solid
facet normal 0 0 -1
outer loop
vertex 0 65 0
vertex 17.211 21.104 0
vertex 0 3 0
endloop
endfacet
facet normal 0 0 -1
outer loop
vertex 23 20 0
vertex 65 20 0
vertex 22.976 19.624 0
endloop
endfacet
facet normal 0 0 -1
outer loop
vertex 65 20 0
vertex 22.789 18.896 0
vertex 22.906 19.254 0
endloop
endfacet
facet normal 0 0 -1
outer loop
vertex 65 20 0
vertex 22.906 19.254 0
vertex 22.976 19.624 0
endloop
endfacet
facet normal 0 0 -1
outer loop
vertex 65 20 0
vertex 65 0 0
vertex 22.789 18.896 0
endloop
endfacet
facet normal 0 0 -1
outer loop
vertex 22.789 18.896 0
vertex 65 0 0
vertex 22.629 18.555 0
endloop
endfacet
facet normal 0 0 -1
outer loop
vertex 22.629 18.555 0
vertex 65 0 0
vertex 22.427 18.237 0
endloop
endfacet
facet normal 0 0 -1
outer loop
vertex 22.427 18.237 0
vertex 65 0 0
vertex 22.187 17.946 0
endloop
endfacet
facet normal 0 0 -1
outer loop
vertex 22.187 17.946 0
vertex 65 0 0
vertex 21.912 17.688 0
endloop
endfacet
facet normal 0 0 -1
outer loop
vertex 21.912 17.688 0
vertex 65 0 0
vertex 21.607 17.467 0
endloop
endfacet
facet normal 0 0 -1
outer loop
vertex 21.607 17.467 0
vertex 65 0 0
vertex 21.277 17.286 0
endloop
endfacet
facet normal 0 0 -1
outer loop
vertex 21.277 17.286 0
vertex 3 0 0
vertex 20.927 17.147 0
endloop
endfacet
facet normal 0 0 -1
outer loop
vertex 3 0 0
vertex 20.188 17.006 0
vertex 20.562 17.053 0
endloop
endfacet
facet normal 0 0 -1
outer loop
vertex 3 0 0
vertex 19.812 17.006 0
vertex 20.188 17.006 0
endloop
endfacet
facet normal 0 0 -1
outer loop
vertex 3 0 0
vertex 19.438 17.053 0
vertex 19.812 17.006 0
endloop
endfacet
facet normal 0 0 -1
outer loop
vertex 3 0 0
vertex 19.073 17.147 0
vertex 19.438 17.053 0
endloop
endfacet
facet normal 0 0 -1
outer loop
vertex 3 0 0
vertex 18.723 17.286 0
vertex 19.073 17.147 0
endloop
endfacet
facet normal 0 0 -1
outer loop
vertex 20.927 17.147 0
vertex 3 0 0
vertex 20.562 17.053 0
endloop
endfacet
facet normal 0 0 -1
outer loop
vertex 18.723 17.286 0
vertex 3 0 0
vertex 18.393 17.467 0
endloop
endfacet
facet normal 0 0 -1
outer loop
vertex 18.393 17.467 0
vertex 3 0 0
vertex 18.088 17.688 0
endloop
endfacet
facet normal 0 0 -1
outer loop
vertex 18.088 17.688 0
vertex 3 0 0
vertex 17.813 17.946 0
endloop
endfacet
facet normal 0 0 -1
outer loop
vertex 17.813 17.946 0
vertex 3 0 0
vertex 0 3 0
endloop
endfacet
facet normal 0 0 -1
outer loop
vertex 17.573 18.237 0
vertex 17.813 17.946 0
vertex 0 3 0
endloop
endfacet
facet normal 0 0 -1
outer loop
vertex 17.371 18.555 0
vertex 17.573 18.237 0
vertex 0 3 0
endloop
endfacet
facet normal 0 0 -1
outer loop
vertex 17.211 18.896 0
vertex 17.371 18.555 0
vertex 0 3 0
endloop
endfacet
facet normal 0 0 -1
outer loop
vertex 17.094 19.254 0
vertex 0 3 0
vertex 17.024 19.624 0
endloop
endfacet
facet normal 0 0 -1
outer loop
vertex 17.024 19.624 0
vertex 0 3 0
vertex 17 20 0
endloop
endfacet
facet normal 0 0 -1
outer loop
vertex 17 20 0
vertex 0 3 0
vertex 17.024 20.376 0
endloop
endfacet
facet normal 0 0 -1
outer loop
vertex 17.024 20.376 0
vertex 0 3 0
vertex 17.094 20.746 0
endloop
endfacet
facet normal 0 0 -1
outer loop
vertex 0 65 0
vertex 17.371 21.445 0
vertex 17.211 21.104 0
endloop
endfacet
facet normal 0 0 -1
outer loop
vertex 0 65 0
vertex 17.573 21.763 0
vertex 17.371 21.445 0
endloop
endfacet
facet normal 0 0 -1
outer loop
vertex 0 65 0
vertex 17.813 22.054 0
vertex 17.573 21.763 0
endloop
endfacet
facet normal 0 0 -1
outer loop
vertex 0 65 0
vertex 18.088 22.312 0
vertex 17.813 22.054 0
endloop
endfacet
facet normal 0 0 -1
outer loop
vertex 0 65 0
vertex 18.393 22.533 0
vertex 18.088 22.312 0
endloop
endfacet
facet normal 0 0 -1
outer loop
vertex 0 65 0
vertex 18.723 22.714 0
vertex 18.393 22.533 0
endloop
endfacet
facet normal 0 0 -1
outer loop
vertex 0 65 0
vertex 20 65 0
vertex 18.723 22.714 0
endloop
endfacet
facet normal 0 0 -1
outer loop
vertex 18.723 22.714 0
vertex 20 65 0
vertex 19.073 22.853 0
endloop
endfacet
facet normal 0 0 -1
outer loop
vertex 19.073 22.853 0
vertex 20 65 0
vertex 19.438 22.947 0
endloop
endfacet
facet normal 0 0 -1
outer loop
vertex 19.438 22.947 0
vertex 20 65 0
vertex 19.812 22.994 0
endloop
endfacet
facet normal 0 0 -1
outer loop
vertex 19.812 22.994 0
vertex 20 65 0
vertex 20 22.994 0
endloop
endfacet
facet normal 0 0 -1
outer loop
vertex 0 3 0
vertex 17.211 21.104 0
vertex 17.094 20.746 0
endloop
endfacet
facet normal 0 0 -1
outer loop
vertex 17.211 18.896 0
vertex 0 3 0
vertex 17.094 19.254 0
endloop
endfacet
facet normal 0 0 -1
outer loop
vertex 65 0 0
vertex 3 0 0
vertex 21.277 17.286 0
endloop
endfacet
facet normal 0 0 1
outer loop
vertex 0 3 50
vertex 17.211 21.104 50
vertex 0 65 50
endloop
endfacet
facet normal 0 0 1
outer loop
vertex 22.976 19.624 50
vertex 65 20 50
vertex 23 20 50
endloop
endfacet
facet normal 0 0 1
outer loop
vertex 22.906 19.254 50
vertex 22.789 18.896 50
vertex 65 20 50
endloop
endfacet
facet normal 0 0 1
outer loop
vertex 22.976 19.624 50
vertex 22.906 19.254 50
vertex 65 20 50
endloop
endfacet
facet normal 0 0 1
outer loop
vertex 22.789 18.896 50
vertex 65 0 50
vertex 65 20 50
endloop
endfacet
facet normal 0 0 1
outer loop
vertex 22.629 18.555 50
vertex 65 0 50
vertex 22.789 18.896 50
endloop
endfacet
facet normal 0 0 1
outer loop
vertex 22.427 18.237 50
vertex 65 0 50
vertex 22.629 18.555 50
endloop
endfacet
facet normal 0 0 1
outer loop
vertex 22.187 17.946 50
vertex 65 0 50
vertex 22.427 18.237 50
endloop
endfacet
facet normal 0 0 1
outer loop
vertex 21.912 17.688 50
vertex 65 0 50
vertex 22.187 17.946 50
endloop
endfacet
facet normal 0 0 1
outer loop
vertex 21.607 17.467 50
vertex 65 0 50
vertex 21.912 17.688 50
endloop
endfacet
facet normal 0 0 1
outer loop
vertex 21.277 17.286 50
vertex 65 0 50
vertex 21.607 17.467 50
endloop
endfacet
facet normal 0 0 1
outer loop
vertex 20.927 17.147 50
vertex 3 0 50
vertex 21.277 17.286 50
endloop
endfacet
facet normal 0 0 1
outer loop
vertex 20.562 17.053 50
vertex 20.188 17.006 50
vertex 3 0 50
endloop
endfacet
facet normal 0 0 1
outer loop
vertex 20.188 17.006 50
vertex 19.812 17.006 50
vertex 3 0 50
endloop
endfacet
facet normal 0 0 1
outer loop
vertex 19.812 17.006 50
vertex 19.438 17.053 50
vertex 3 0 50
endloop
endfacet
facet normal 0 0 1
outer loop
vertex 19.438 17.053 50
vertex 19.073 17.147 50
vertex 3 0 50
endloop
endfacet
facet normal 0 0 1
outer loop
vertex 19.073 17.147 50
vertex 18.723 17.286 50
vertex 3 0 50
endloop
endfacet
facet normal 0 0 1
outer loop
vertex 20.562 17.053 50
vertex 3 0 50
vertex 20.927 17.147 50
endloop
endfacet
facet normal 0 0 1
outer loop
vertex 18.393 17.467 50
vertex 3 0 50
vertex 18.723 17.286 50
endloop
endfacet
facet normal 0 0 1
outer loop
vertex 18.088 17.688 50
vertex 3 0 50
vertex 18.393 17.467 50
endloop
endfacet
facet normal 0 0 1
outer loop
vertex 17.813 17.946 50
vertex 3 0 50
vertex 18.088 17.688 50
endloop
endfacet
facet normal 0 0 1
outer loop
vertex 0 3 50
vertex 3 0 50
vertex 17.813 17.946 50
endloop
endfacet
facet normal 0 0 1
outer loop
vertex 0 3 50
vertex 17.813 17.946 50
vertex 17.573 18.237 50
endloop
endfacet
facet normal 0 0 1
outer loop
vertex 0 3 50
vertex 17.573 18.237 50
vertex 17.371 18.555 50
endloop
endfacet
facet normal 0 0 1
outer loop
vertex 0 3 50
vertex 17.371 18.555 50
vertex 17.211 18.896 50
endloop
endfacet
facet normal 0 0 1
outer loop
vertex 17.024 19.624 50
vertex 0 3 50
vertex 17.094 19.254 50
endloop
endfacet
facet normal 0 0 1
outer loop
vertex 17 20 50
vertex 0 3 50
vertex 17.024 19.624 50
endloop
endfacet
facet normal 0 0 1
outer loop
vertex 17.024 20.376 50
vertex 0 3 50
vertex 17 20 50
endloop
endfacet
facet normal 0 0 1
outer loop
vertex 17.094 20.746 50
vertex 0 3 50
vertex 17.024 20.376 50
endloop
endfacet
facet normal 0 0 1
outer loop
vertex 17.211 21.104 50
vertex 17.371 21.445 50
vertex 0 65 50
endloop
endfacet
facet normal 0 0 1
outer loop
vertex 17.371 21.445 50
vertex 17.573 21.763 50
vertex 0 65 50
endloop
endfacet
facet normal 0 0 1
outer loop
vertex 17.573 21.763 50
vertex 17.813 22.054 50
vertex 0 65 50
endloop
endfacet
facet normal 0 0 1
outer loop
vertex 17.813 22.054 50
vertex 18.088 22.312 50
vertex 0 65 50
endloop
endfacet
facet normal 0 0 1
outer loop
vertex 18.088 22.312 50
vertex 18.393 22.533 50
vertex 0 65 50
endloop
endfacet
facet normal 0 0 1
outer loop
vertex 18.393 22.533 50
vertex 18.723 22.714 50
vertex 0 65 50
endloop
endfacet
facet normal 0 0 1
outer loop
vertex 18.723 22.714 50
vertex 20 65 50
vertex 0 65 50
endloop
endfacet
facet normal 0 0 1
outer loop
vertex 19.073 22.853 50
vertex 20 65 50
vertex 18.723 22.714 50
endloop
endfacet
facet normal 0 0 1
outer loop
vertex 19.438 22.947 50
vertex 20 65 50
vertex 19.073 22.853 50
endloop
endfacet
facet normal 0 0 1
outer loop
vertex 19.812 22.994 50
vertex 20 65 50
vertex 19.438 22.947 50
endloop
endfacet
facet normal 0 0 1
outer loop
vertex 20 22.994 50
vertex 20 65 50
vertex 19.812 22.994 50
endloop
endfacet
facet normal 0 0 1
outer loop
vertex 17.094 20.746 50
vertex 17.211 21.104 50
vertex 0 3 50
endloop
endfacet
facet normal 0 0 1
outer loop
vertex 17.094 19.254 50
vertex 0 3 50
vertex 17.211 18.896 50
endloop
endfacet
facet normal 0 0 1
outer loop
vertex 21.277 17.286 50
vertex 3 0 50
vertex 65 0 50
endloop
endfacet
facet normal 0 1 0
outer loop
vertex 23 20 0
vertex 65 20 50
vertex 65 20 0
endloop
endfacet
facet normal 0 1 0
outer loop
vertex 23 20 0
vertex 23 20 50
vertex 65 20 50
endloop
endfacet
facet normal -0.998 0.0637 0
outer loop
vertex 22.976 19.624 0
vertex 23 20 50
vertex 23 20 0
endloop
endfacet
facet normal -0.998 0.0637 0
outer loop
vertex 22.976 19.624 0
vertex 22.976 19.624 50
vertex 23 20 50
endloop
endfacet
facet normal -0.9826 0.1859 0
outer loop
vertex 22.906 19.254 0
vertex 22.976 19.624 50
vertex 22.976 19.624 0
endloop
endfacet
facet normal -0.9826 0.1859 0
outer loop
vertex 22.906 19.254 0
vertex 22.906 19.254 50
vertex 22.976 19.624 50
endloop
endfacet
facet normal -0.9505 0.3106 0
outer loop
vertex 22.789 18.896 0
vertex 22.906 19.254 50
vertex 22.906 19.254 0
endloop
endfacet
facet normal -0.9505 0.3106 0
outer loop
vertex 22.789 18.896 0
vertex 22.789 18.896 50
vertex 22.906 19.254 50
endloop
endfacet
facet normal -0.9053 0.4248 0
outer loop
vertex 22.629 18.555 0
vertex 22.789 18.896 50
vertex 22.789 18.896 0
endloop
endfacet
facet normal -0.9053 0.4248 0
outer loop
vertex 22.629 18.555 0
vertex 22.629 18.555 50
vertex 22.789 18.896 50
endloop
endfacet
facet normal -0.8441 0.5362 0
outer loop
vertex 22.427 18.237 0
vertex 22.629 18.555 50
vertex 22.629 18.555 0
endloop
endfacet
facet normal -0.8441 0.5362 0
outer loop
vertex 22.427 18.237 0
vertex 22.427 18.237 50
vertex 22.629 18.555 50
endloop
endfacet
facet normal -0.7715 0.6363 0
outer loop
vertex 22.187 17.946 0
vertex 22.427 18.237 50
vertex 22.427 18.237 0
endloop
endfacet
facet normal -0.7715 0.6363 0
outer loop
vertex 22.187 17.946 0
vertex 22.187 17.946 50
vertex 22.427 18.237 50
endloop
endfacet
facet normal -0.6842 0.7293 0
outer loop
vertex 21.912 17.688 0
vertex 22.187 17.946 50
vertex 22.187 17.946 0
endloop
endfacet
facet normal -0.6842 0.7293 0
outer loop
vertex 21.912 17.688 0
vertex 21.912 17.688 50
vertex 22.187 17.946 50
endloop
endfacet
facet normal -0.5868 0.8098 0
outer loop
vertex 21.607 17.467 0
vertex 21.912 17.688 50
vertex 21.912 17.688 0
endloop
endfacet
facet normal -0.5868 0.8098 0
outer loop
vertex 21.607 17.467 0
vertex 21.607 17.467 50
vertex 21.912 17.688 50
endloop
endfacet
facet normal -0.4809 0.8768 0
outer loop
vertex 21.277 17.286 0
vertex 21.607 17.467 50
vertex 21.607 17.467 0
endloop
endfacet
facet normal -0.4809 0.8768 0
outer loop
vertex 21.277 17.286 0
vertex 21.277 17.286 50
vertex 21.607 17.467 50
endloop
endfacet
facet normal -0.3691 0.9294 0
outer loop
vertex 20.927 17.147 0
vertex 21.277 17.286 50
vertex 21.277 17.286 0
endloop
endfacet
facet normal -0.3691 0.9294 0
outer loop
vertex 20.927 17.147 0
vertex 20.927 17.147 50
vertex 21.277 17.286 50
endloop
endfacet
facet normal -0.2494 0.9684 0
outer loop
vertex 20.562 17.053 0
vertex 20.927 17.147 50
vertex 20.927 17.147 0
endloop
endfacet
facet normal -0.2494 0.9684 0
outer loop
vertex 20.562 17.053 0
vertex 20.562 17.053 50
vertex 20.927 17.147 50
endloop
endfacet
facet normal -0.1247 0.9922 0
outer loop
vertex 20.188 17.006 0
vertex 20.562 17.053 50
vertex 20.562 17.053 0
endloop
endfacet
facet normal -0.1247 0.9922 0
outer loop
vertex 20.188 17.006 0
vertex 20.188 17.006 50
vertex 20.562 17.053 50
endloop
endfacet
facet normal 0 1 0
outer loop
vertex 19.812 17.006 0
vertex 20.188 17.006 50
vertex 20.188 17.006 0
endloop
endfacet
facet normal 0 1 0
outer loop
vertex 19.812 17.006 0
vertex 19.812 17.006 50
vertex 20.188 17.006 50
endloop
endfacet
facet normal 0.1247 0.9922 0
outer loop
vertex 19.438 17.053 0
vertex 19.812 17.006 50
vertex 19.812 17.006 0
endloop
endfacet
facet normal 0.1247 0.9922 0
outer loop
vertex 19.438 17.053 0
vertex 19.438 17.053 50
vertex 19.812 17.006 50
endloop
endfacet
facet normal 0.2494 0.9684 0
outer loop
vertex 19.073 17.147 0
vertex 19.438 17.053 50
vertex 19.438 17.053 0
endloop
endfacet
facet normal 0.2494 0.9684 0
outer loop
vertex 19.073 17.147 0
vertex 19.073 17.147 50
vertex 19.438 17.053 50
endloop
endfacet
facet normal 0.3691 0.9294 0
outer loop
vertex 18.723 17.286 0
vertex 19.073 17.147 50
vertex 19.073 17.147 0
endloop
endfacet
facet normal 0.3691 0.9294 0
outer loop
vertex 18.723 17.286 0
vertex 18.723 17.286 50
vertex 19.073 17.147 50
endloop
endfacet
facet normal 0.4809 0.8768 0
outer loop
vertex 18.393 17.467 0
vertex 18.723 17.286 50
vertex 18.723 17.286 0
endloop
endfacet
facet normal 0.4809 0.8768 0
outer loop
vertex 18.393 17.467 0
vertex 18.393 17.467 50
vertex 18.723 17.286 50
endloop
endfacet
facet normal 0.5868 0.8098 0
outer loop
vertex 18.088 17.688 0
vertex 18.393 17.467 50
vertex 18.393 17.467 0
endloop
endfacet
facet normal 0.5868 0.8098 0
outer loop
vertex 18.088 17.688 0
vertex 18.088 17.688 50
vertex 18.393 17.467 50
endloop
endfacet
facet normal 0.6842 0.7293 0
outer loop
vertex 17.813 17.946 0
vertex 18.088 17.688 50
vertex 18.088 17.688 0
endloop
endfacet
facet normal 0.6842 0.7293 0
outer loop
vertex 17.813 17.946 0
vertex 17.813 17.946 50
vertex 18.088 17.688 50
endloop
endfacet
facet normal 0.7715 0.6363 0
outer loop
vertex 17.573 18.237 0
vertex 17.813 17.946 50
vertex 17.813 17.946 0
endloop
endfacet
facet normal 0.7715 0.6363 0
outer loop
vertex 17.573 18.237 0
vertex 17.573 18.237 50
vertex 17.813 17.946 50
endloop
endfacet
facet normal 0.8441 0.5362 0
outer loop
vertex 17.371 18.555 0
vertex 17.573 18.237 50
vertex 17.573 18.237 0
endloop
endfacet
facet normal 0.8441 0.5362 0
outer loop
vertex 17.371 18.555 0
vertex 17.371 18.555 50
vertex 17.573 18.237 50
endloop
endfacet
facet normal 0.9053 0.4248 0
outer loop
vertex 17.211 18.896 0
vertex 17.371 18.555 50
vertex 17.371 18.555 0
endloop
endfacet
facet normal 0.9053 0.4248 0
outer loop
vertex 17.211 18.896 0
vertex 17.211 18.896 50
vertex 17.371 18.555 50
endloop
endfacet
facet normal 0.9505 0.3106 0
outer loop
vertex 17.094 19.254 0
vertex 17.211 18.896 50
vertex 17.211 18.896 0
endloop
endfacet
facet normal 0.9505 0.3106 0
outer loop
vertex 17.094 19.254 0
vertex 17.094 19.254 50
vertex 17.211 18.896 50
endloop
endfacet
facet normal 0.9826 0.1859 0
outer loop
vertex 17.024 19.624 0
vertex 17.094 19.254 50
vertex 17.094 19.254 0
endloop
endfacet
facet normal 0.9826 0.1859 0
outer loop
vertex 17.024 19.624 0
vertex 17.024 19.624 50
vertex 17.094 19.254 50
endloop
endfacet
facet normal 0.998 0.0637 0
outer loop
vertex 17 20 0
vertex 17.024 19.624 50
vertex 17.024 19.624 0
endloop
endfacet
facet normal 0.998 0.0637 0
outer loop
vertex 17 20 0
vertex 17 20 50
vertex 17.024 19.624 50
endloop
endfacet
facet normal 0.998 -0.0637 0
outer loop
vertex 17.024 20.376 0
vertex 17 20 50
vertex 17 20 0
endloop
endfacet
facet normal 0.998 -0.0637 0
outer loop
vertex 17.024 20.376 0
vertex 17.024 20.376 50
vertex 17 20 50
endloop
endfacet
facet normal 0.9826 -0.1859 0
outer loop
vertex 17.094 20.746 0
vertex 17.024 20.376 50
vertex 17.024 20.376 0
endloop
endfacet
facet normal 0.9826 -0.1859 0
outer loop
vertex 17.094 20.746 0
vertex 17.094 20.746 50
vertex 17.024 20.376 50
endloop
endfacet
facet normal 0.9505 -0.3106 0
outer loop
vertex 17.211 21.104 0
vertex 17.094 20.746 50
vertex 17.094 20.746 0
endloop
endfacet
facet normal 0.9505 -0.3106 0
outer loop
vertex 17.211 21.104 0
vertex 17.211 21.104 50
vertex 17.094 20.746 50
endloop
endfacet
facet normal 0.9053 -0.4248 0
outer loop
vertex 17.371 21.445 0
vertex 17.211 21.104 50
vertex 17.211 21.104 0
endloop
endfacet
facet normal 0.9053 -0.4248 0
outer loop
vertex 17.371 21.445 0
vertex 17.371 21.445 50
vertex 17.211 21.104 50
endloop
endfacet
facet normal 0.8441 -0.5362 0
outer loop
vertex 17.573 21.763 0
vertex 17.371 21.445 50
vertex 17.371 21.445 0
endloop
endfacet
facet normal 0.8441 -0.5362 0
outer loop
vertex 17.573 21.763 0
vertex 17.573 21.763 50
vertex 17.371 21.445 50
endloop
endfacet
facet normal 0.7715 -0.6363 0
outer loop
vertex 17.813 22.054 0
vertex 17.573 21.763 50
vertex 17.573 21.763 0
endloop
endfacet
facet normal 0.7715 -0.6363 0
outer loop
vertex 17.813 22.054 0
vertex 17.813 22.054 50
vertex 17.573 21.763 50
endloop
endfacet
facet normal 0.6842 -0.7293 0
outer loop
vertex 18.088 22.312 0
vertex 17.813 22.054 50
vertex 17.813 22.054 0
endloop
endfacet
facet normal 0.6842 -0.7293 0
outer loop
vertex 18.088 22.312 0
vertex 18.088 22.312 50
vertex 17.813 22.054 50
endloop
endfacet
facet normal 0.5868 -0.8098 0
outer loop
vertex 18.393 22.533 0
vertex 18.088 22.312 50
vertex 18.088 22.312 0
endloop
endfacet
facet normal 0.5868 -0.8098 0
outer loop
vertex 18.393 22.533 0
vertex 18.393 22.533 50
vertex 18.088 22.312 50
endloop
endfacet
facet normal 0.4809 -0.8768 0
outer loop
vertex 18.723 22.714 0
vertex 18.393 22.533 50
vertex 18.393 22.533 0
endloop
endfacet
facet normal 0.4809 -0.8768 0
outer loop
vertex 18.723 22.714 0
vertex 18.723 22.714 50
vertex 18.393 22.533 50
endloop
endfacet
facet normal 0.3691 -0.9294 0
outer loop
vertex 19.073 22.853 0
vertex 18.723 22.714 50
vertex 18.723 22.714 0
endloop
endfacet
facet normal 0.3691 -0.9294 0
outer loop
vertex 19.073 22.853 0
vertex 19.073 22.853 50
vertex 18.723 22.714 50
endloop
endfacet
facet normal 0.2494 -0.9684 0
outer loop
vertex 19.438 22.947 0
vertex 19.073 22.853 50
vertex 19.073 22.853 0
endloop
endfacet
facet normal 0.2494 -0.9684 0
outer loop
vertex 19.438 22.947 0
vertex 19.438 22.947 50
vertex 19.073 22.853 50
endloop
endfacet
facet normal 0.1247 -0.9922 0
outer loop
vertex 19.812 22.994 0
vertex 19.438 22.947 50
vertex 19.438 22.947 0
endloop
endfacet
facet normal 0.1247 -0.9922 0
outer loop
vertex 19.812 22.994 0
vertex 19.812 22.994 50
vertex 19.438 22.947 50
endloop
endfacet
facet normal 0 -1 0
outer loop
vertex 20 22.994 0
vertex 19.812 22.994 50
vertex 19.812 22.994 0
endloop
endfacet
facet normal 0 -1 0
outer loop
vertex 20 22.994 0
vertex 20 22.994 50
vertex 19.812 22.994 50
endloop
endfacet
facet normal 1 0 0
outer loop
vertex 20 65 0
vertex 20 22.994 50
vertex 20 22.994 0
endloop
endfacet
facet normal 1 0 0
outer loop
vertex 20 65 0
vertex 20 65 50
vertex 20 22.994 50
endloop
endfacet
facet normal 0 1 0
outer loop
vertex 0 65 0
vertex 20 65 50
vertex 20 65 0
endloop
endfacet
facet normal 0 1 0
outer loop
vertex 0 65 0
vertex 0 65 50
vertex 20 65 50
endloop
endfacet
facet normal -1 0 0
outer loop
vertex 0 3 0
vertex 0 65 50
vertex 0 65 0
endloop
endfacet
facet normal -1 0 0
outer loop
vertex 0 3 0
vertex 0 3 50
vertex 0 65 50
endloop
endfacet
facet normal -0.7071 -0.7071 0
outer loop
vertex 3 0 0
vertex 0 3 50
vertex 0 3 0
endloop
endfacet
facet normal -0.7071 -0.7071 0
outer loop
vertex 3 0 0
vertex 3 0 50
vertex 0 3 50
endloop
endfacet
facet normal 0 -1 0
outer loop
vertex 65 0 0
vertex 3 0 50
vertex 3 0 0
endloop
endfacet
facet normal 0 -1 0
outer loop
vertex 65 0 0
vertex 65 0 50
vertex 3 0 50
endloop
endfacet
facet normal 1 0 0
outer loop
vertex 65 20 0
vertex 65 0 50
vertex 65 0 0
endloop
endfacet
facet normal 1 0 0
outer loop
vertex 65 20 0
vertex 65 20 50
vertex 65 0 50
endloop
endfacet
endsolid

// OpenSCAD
$fn=50;
poly=[[0,3],[0,65],[20,65],[20,20],[65,20],[65,0],[3,0]];

linear_extrude(50) difference(){
  polygon(poly);
  translate([20,20]) circle(3);
}
  
